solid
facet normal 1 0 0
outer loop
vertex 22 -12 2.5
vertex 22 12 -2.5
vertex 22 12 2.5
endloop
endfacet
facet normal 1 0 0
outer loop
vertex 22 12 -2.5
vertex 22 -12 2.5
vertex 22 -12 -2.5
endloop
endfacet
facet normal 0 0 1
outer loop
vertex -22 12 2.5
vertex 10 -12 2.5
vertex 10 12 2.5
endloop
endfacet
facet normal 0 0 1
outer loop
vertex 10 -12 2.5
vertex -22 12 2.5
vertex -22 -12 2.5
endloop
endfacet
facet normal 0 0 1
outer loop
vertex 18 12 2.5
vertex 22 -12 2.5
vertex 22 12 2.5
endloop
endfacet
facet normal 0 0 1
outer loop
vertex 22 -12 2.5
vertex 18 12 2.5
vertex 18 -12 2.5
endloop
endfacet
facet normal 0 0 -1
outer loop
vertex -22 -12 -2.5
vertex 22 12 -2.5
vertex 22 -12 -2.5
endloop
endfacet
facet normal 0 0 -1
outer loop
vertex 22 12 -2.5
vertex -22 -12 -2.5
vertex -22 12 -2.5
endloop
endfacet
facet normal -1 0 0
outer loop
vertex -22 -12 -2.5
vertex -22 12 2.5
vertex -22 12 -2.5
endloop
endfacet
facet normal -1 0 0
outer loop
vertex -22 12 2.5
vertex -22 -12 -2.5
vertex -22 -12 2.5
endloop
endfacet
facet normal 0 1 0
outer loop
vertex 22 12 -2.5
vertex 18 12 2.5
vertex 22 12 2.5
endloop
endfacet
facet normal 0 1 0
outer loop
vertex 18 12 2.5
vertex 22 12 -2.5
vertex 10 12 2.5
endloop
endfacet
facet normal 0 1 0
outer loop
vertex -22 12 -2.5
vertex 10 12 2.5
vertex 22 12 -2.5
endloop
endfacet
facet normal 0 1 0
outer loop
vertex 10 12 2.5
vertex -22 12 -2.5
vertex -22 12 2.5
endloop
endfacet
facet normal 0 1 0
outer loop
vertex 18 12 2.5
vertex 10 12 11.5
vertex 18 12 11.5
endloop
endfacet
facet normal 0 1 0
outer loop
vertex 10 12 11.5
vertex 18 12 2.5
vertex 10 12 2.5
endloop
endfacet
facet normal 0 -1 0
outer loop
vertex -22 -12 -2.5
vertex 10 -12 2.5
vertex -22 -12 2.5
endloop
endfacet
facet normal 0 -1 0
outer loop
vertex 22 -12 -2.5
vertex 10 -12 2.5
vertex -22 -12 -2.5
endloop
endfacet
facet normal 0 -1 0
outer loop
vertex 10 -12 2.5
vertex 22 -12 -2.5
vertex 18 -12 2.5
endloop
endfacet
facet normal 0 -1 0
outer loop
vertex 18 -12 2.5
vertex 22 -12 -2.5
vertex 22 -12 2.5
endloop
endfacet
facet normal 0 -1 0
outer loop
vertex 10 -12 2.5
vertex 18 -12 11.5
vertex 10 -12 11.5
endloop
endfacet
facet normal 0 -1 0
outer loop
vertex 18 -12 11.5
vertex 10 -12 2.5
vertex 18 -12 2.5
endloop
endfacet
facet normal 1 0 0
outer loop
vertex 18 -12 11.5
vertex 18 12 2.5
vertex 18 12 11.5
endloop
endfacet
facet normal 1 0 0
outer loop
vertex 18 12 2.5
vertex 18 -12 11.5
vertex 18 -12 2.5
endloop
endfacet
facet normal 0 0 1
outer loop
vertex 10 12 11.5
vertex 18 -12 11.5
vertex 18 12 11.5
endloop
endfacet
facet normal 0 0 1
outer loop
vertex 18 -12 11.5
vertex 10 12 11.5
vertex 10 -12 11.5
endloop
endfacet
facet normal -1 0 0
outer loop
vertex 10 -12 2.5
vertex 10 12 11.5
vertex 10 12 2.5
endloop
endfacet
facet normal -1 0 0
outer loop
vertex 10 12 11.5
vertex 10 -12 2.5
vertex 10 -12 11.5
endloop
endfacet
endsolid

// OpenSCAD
// Simple jaw plate, dimensions in millimeters.
$fn = 32;
module jaw() {
  union() {
    cube([44, 24, 5], center = true);
    translate([14, 0, 7]) cube([8, 24, 9], center = true);
  }
}
jaw();
